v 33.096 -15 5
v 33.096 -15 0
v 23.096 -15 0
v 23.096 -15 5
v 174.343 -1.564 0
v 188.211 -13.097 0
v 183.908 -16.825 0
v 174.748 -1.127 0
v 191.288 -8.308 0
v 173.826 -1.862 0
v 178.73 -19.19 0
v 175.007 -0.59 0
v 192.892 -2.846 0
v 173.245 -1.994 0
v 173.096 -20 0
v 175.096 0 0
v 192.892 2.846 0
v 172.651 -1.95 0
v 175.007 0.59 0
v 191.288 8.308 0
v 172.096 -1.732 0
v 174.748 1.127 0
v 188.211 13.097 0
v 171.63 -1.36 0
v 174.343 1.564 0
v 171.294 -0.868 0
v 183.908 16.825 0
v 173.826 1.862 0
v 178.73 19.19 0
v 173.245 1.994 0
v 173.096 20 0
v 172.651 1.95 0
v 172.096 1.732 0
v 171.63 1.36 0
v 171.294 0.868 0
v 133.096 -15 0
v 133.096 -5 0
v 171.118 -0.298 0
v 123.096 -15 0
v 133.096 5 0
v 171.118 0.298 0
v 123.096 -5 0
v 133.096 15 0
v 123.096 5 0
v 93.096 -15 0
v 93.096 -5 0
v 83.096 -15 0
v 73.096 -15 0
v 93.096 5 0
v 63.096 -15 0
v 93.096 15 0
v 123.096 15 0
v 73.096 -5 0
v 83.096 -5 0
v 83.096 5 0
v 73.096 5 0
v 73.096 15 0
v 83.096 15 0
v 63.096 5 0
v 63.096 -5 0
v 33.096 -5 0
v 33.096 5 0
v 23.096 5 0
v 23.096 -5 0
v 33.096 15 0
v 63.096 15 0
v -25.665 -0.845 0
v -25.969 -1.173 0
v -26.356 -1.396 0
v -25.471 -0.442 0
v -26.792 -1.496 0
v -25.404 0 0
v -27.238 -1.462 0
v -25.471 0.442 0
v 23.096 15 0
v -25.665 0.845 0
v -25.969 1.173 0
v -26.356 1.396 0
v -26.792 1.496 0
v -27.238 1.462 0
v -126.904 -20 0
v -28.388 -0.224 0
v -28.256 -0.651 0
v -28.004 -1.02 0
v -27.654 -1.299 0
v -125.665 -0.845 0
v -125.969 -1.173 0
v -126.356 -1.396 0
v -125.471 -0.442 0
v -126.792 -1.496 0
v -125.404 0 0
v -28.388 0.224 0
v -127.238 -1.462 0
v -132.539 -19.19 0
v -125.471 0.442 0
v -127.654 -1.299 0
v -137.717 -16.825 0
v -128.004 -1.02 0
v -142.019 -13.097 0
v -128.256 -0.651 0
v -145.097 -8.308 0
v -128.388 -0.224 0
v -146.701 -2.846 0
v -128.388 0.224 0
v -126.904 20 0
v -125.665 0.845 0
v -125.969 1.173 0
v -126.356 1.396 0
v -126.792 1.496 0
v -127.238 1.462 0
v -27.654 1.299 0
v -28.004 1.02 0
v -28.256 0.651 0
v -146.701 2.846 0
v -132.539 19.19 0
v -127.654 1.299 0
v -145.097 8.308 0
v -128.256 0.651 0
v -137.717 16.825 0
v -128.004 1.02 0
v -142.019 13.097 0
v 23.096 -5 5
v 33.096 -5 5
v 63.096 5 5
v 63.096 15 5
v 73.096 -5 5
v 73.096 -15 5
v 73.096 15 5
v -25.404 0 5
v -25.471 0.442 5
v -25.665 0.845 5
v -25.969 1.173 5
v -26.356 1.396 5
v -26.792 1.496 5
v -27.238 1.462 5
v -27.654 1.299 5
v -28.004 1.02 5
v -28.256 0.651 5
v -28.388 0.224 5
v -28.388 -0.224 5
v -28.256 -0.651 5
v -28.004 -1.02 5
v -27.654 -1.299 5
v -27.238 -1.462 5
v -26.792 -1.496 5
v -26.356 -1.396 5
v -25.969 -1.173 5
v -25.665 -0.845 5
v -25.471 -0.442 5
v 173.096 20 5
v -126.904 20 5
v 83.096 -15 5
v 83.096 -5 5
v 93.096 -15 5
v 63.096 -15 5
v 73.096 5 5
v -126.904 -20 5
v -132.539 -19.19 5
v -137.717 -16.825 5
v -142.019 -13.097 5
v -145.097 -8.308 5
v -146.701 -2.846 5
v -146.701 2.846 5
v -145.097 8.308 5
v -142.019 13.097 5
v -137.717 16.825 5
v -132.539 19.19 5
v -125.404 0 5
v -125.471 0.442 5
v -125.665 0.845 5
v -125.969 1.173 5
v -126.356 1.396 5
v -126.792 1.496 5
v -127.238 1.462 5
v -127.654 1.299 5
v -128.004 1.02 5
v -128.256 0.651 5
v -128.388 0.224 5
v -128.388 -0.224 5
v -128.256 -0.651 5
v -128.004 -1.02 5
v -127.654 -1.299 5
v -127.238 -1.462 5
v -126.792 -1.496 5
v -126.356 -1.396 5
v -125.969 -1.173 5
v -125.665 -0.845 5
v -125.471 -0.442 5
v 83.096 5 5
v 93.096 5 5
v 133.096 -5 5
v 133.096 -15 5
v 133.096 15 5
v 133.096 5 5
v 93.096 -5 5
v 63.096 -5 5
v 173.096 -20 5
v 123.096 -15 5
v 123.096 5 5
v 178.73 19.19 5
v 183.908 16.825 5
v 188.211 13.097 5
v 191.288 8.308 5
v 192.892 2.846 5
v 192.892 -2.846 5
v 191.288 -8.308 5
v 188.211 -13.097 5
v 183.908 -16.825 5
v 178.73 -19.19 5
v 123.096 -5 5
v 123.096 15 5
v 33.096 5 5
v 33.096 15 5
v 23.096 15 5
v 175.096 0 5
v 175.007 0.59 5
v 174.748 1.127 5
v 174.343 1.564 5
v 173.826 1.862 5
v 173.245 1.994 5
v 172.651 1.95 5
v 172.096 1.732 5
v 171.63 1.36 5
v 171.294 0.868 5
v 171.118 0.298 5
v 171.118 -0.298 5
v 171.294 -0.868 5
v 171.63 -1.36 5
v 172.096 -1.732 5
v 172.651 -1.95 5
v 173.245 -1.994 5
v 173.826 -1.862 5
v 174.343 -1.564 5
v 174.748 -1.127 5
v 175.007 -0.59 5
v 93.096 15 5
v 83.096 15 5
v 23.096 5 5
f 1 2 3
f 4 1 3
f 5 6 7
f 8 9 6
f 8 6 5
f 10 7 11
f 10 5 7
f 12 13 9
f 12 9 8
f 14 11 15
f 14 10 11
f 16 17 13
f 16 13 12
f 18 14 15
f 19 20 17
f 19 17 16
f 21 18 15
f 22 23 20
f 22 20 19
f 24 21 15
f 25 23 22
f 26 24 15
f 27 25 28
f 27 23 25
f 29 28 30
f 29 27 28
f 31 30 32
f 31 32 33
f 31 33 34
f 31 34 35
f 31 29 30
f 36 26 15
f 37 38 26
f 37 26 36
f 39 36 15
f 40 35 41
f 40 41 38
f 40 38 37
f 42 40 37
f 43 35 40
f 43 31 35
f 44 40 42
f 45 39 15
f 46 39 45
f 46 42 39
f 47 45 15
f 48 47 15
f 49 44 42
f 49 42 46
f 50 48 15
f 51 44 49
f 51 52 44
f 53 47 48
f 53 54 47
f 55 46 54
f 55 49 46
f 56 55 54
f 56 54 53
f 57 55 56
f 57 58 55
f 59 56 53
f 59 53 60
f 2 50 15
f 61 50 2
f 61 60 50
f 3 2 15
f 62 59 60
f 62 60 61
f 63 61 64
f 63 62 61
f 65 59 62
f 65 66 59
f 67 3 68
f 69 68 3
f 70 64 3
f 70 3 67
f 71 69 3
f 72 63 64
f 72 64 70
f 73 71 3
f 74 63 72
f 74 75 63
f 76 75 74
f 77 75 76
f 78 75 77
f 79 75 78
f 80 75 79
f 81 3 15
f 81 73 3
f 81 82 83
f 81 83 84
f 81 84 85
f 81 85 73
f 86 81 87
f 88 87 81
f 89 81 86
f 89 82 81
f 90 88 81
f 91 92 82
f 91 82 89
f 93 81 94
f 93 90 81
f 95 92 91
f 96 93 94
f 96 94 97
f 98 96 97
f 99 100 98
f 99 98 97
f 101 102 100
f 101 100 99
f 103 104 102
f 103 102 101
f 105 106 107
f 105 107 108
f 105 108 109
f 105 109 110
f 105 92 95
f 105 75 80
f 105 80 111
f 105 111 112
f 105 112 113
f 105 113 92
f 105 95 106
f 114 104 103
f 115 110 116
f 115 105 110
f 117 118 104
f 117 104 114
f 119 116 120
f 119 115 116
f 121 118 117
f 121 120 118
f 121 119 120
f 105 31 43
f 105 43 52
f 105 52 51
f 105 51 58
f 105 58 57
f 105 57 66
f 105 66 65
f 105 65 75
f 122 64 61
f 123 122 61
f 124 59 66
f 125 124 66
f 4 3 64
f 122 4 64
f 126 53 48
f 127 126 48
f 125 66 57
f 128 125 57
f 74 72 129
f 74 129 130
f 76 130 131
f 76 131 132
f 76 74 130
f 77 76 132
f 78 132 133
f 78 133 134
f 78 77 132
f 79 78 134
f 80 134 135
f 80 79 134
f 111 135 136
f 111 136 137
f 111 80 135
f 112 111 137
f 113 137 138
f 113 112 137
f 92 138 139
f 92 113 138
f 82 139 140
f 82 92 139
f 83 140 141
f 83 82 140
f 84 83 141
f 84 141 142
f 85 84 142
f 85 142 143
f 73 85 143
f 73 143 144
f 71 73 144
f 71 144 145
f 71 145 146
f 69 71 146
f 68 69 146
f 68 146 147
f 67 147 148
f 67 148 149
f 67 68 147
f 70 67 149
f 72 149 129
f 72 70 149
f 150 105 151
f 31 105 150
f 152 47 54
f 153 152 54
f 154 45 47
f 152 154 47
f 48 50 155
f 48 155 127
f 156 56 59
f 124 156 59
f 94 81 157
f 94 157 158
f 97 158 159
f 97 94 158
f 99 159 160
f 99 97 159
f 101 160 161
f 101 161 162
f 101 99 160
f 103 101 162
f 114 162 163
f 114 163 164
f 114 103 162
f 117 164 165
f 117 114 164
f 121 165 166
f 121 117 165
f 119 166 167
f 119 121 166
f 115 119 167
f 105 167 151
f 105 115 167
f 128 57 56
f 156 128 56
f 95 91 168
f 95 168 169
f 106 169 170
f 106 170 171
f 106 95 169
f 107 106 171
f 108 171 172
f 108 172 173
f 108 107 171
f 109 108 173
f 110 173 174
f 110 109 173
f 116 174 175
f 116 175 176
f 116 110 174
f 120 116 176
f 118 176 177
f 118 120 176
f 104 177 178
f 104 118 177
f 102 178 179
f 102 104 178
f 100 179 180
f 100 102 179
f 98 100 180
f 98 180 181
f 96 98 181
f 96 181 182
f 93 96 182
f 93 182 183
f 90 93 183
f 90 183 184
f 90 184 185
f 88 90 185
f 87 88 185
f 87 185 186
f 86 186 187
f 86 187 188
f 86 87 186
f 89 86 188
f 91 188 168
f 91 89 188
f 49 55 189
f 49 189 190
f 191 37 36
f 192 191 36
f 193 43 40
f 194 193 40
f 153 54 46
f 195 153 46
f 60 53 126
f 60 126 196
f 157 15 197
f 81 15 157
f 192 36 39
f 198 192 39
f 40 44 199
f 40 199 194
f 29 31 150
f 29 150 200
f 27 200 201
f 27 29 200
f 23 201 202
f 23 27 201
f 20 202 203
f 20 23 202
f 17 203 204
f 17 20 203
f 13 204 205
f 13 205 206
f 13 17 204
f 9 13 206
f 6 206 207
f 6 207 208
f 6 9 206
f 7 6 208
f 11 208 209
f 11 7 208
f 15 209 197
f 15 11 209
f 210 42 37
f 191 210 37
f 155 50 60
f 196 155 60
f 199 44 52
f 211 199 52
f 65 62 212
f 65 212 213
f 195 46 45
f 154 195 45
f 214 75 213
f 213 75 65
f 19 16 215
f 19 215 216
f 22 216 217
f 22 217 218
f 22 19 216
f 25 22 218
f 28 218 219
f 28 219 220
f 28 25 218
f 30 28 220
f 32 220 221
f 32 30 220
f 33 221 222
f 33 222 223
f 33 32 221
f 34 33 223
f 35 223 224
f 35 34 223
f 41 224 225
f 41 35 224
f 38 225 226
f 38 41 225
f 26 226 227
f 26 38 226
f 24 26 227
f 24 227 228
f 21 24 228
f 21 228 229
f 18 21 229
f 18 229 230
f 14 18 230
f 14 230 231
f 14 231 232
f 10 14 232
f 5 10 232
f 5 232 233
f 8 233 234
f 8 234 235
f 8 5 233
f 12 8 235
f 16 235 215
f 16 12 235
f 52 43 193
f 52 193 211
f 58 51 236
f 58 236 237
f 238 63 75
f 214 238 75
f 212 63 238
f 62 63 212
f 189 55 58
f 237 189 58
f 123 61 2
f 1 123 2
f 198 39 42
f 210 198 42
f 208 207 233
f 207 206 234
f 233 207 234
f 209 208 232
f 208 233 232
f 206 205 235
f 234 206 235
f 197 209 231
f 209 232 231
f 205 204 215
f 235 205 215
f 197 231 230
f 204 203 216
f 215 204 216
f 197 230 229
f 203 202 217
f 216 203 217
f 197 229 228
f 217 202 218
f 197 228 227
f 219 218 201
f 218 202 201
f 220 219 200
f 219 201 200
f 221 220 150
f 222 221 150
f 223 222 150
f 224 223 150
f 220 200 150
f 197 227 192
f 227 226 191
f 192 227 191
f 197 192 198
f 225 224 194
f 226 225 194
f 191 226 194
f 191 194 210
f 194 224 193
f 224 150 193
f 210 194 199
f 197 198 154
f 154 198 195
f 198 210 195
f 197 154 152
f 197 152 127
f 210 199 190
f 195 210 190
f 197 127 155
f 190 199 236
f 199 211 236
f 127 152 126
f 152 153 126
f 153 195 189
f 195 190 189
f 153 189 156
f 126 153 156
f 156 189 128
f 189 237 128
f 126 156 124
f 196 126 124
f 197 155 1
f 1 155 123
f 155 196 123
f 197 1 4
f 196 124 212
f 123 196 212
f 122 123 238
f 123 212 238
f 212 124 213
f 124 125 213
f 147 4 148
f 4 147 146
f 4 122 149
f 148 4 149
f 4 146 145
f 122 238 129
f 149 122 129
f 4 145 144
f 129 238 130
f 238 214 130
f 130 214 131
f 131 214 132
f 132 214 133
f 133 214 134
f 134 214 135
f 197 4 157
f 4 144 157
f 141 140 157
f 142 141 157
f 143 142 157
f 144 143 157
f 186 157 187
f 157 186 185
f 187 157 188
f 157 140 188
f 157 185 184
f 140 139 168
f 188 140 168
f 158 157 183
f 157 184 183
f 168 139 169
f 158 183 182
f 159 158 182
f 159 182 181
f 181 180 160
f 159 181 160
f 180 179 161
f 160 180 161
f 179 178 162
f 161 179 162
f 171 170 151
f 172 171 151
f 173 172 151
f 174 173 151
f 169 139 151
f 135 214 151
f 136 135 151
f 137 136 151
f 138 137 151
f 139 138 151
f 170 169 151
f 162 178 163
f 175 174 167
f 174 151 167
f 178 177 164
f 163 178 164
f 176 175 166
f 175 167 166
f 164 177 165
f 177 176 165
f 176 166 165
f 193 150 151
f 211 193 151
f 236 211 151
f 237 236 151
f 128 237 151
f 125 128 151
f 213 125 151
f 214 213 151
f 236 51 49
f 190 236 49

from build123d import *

# Parameters (mm, degrees)
SKETCH1_R           = 1.5
SKETCH1_R_2         = 2
SKETCH1_W           = 10
SKETCH1_H           = 10
BOSS_EXTRUDE1_DEPTH = 5


with BuildPart() as part:
    # Sketch1 → Boss-Extrude1 (new body)
    with BuildSketch(Plane.XY):
        with BuildLine():
            Line((-126.904376013, 20), (173.095623987, 20))
            ThreePointArc((173.095623987, 20), (193.095623987, 0), (173.095623987, -20))
            Line((173.095623987, -20), (-126.904376013, -20))
            ThreePointArc((-126.904376013, -20), (-146.904376013, 0), (-126.904376013, 20))
        make_face()
        with Locations((-126.904376013, 0)):
            Circle(SKETCH1_R, mode=Mode.SUBTRACT)
        with Locations((173.095623987, 0)):
            Circle(SKETCH1_R_2, mode=Mode.SUBTRACT)
        with Locations((-26.904376013, 0)):
            Circle(SKETCH1_R, mode=Mode.SUBTRACT)
        Polygon((63.095623987, 15), (73.095623987, 15), (73.095623987, 10), (73.095623987, 5), (63.095623987, 5), (63.095623987, 10), align=None, mode=Mode.SUBTRACT)
        Polygon((83.095623987, 10), (83.095623987, 5), (93.095623987, 5), (93.095623987, 10), (93.095623987, 15), (83.095623987, 15), align=None, mode=Mode.SUBTRACT)
        Polygon((123.095623987, 10), (123.095623987, 5), (133.095623987, 5), (133.095623987, 10), (133.095623987, 15), (123.095623987, 15), align=None, mode=Mode.SUBTRACT)
        Polygon((33.095623987, -15), (23.095623987, -15), (23.095623987, -10), (23.095623987, -5), (33.095623987, -5), (33.095623987, -10), align=None, mode=Mode.SUBTRACT)
        Polygon((63.095623987, -15), (73.095623987, -15), (73.095623987, -10), (73.095623987, -5), (63.095623987, -5), (63.095623987, -10), align=None, mode=Mode.SUBTRACT)
        Polygon((83.095623987, -10), (83.095623987, -5), (93.095623987, -5), (93.095623987, -10), (93.095623987, -15), (83.095623987, -15), align=None, mode=Mode.SUBTRACT)
        Polygon((123.095623987, -5), (133.095623987, -5), (133.095623987, -10), (133.095623987, -15), (123.095623987, -15), (123.095623987, -10), align=None, mode=Mode.SUBTRACT)
        with Locations((28.095623987, 10)):
            Rectangle(SKETCH1_W, SKETCH1_H, mode=Mode.SUBTRACT)
    extrude(amount=BOSS_EXTRUDE1_DEPTH)


solid = part.part
